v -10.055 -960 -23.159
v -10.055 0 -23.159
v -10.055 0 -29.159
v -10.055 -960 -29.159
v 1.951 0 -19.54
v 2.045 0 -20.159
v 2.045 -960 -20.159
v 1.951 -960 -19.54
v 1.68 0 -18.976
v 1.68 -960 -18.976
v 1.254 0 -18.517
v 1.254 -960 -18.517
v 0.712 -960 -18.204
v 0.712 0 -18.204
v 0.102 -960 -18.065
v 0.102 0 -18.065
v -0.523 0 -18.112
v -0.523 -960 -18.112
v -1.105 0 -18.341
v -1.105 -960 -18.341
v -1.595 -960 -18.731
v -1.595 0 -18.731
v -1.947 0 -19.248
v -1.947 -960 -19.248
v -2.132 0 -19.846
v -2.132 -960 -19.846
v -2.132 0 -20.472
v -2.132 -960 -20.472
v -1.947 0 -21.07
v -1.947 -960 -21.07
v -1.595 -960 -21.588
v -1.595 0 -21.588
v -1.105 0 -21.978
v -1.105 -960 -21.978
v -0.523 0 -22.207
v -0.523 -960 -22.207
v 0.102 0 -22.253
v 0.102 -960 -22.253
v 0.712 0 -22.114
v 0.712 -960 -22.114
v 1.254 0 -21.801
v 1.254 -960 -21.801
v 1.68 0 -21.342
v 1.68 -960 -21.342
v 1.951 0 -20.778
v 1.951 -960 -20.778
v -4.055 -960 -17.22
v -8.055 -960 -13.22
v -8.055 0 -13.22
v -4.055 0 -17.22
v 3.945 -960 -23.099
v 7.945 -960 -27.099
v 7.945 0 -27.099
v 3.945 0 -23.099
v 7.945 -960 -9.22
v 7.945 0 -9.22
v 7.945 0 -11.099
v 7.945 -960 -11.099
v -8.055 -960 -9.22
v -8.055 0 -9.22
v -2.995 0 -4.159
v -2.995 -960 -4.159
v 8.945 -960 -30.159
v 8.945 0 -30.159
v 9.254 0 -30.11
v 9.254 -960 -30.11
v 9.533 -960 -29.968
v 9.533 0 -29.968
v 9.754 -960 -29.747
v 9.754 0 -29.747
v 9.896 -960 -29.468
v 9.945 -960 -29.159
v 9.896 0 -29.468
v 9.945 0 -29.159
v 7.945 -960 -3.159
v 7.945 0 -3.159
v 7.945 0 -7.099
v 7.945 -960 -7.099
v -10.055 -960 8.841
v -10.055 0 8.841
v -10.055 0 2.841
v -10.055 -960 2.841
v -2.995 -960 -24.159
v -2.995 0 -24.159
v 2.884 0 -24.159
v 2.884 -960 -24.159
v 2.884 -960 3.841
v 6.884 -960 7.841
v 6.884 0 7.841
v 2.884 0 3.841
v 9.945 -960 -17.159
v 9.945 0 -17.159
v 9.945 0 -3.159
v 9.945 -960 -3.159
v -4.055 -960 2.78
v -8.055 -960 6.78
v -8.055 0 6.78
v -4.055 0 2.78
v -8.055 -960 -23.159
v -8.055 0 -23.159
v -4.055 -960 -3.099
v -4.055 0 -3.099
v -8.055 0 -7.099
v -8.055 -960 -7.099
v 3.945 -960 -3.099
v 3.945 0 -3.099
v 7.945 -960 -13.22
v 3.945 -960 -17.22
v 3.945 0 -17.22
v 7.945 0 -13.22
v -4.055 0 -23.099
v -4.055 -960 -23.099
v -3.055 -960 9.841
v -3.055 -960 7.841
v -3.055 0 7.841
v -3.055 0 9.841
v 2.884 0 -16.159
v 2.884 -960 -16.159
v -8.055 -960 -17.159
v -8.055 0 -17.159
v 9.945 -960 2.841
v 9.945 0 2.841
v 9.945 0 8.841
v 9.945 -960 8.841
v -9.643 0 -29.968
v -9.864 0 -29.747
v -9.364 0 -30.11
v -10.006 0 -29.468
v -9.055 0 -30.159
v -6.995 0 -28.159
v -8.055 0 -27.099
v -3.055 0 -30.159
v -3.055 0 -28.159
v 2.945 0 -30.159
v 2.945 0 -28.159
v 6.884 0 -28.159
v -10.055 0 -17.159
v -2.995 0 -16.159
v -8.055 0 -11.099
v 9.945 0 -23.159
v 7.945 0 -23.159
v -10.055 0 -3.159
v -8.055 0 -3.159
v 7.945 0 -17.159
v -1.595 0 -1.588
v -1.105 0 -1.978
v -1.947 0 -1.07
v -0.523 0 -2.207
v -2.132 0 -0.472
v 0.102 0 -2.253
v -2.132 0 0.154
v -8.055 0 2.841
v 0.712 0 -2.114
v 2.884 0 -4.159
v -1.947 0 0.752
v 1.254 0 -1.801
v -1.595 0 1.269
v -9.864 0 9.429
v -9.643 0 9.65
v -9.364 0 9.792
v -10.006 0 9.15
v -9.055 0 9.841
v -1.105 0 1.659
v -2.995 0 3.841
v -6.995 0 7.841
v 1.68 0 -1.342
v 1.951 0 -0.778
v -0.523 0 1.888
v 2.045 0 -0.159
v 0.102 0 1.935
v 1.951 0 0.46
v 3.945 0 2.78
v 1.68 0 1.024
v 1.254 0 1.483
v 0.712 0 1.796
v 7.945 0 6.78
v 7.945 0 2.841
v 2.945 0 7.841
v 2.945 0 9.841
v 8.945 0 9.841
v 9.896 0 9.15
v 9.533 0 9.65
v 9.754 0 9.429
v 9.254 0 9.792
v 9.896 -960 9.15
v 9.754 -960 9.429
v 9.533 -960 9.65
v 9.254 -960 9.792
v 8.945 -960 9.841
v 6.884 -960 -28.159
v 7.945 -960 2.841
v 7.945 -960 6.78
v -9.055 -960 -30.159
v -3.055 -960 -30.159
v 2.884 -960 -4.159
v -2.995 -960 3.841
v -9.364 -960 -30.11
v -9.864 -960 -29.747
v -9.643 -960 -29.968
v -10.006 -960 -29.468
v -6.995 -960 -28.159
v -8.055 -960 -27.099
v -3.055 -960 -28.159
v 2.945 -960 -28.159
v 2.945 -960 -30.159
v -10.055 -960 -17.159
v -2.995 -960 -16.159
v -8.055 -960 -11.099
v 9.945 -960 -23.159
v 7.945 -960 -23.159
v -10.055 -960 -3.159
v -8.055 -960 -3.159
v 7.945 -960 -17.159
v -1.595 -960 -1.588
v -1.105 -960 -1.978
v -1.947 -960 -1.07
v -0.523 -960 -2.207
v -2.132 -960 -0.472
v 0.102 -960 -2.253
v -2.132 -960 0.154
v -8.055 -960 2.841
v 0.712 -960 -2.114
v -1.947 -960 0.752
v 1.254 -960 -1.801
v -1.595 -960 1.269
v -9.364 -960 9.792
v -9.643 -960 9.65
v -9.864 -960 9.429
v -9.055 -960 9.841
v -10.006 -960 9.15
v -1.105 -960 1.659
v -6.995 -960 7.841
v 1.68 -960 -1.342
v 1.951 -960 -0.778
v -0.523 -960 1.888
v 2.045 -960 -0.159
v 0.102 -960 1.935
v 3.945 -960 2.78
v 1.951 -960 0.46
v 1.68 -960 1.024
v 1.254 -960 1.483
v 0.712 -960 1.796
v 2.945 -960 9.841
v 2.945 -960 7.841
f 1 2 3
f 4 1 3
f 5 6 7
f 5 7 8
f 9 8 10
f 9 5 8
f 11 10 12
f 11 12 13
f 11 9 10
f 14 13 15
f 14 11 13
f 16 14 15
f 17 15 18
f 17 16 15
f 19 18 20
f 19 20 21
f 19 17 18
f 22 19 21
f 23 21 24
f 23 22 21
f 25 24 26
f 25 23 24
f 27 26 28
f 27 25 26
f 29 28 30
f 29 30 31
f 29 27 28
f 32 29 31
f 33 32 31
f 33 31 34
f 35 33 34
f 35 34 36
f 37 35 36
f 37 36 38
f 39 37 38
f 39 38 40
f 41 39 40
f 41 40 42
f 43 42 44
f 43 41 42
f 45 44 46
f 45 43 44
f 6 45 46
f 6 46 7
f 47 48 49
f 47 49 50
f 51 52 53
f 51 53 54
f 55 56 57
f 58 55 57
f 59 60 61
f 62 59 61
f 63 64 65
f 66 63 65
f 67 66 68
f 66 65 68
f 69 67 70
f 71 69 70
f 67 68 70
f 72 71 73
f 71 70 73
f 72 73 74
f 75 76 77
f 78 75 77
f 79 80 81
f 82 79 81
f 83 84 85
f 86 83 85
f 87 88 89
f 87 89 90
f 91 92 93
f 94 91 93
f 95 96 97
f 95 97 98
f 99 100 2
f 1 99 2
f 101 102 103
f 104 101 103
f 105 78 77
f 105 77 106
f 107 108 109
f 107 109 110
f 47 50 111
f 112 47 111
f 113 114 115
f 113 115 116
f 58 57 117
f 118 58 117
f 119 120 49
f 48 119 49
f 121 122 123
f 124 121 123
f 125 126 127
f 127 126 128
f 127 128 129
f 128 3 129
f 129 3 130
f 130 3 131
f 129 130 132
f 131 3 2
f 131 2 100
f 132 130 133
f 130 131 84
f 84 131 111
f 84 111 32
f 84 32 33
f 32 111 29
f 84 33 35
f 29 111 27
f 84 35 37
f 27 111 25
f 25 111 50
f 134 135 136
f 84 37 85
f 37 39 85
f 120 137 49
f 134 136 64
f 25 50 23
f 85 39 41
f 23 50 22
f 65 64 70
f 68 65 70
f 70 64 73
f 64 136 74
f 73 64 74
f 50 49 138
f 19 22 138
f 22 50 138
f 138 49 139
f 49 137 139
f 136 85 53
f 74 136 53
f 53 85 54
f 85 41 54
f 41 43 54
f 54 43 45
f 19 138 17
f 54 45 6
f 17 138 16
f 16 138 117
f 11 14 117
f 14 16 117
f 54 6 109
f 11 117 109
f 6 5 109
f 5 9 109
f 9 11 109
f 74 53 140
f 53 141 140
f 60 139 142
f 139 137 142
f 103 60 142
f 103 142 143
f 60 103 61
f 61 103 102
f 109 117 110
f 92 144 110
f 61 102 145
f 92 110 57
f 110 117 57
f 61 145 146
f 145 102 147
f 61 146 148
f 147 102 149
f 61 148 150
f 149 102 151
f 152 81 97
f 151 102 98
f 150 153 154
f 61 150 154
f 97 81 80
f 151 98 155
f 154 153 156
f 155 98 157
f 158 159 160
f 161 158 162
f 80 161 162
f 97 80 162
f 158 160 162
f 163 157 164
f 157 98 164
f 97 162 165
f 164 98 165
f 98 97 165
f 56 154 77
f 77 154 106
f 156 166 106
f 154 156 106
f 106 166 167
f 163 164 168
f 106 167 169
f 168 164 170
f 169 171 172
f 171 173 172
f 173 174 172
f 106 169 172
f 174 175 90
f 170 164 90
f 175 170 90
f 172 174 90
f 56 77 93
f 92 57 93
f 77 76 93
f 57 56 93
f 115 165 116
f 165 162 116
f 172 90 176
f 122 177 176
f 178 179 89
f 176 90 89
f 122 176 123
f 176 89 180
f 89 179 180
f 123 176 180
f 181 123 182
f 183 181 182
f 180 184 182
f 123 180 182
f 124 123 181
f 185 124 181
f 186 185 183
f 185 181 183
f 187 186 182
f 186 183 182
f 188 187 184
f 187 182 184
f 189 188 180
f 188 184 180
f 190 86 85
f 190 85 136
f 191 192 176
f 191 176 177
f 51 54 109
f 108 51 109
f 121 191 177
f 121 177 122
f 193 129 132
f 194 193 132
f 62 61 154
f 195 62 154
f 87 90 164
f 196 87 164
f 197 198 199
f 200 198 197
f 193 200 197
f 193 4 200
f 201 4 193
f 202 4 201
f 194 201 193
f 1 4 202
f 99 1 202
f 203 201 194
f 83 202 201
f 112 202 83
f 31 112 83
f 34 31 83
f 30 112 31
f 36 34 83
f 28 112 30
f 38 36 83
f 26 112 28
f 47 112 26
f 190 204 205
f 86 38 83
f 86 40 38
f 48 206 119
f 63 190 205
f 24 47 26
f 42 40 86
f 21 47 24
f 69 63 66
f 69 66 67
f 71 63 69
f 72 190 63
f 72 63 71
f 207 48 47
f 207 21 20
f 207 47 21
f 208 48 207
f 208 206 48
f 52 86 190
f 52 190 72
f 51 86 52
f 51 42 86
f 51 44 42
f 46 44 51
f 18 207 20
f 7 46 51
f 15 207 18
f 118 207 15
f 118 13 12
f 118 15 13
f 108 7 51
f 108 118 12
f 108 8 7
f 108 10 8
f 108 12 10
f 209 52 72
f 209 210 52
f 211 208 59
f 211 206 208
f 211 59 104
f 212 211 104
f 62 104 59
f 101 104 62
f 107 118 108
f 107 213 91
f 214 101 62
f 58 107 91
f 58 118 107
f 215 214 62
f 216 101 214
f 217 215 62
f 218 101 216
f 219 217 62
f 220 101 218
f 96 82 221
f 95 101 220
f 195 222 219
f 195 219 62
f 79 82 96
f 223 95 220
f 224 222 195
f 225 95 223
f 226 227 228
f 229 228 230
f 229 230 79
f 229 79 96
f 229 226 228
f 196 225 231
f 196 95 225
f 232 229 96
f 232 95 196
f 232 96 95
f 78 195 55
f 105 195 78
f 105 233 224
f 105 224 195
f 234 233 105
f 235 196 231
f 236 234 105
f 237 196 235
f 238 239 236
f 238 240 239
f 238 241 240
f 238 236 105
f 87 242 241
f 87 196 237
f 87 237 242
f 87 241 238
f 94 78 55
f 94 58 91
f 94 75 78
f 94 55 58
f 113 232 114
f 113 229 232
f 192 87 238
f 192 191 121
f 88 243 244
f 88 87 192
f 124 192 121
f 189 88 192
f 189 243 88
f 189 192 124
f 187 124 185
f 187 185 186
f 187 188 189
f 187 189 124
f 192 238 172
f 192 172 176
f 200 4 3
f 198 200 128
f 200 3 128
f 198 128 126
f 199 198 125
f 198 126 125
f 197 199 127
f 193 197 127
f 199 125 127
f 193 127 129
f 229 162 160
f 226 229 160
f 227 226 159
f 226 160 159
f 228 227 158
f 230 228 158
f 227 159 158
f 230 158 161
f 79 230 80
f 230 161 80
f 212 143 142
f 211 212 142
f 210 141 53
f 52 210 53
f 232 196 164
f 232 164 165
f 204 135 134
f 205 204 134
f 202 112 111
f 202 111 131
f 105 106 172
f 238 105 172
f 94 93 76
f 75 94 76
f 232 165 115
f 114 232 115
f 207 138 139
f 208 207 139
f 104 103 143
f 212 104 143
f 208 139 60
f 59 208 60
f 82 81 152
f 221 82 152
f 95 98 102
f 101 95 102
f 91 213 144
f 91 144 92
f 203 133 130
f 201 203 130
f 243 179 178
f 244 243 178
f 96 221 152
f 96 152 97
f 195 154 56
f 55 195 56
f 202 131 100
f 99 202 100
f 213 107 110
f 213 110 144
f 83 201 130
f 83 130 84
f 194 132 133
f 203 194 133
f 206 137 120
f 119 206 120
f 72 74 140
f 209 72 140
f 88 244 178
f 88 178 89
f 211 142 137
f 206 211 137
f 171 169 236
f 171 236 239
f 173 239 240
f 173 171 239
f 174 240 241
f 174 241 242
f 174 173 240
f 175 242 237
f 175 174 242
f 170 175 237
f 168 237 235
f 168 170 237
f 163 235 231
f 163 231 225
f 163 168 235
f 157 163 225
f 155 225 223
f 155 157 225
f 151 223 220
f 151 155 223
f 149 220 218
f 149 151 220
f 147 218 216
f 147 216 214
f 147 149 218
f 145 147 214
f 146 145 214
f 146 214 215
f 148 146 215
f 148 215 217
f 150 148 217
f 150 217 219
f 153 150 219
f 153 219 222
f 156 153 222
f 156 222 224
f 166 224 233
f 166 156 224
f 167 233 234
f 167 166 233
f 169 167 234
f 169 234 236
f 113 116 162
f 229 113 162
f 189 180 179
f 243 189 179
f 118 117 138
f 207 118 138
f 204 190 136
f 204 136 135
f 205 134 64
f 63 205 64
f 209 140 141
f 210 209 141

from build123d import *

# Parameters (mm, degrees)
F0_R     = 2.1
F1_DEPTH = 960


with BuildPart() as f1:
    # F0 (on Front) → F1 (new body)
    with BuildSketch(Plane.XZ):
        with BuildLine():
            ThreePointArc((9.944745, 8.840758), (9.651851, 9.547865), (8.944745, 9.840758))
            Line((8.944745, 9.840758), (2.944745, 9.840758))
            Line((2.944745, 9.840758), (2.944745, 7.840758))
            Line((2.944745, 7.840758), (6.884085, 7.840758))
            Line((6.884085, 7.840758), (2.884085, 3.840758))
            Line((2.884085, 3.840758), (-2.994595, 3.840758))
            Line((-2.994595, 3.840758), (-6.994595, 7.840758))
            Line((-6.994595, 7.840758), (-3.055255, 7.840758))
            Line((-3.055255, 7.840758), (-3.055255, 9.840758))
            Line((-3.055255, 9.840758), (-9.055255, 9.840758))
            ThreePointArc((-9.055255, 9.840758), (-9.762362, 9.547865), (-10.055255, 8.840758))
            Line((-10.055255, 8.840758), (-10.055255, 2.840758))
            Line((-10.055255, 2.840758), (-8.055255, 2.840758))
            Line((-8.055255, 2.840758), (-8.055255, 6.780098))
            Line((-8.055255, 6.780098), (-4.055255, 2.780098))
            Line((-4.055255, 2.780098), (-4.055255, -3.098581))
            Line((-4.055255, -3.098581), (-8.055255, -7.098581))
            Line((-8.055255, -7.098581), (-8.055255, -3.159242))
            Line((-8.055255, -3.159242), (-10.055255, -3.159242))
            Line((-10.055255, -3.159242), (-10.055255, -10.159242))
            Line((-10.055255, -10.159242), (-10.055255, -17.159242))
            Line((-10.055255, -17.159242), (-8.055255, -17.159242))
            Line((-8.055255, -17.159242), (-8.055255, -13.219902))
            Line((-8.055255, -13.219902), (-4.055255, -17.219902))
            Line((-4.055255, -17.219902), (-4.055255, -23.098581))
            Line((-4.055255, -23.098581), (-8.055255, -27.098581))
            Line((-8.055255, -27.098581), (-8.055255, -23.159242))
            Line((-8.055255, -23.159242), (-10.055255, -23.159242))
            Line((-10.055255, -23.159242), (-10.055255, -29.159242))
            ThreePointArc((-10.055255, -29.159242), (-9.762362, -29.866348), (-9.055255, -30.159242))
            Line((-9.055255, -30.159242), (-3.055255, -30.159242))
            Line((-3.055255, -30.159242), (-3.055255, -28.159242))
            Line((-3.055255, -28.159242), (-6.994595, -28.159242))
            Line((-6.994595, -28.159242), (-2.994595, -24.159242))
            Line((-2.994595, -24.159242), (2.884085, -24.159242))
            Line((2.884085, -24.159242), (6.884085, -28.159242))
            Line((6.884085, -28.159242), (2.944745, -28.159242))
            Line((2.944745, -28.159242), (2.944745, -30.159242))
            Line((2.944745, -30.159242), (8.944745, -30.159242))
            ThreePointArc((8.944745, -30.159242), (9.651851, -29.866348), (9.944745, -29.159242))
            Line((9.944745, -29.159242), (9.944745, -23.159242))
            Line((9.944745, -23.159242), (7.944745, -23.159242))
            Line((7.944745, -23.159242), (7.944745, -27.098581))
            Line((7.944745, -27.098581), (3.944745, -23.098581))
            Line((3.944745, -23.098581), (3.944745, -17.219902))
            Line((3.944745, -17.219902), (7.944745, -13.219902))
            Line((7.944745, -13.219902), (7.944745, -17.159242))
            Line((7.944745, -17.159242), (9.944745, -17.159242))
            Line((9.944745, -17.159242), (9.944745, -10.159242))
            Line((9.944745, -10.159242), (9.944745, -3.159242))
            Line((9.944745, -3.159242), (7.944745, -3.159242))
            Line((7.944745, -3.159242), (7.944745, -7.098581))
            Line((7.944745, -7.098581), (3.944745, -3.098581))
            Line((3.944745, -3.098581), (3.944745, 2.780098))
            Line((3.944745, 2.780098), (7.944745, 6.780098))
            Line((7.944745, 6.780098), (7.944745, 2.840758))
            Line((7.944745, 2.840758), (9.944745, 2.840758))
            Line((9.944745, 2.840758), (9.944745, 8.840758))
        make_face()
        with Locations((-0.055255, -20.159242)):
            Circle(F0_R, mode=Mode.SUBTRACT)
        Polygon((-2.994595, -4.159242), (2.884085, -4.159242), (7.944745, -9.219902), (7.944745, -10.159242), (7.944745, -11.098581), (2.884085, -16.159242), (-2.994595, -16.159242), (-8.055255, -11.098581), (-8.055255, -10.159242), (-8.055255, -9.219902), align=None, mode=Mode.SUBTRACT)
        with Locations((-0.055255, -0.159242)):
            Circle(F0_R, mode=Mode.SUBTRACT)
    extrude(amount=F1_DEPTH)


solid = f1.part
